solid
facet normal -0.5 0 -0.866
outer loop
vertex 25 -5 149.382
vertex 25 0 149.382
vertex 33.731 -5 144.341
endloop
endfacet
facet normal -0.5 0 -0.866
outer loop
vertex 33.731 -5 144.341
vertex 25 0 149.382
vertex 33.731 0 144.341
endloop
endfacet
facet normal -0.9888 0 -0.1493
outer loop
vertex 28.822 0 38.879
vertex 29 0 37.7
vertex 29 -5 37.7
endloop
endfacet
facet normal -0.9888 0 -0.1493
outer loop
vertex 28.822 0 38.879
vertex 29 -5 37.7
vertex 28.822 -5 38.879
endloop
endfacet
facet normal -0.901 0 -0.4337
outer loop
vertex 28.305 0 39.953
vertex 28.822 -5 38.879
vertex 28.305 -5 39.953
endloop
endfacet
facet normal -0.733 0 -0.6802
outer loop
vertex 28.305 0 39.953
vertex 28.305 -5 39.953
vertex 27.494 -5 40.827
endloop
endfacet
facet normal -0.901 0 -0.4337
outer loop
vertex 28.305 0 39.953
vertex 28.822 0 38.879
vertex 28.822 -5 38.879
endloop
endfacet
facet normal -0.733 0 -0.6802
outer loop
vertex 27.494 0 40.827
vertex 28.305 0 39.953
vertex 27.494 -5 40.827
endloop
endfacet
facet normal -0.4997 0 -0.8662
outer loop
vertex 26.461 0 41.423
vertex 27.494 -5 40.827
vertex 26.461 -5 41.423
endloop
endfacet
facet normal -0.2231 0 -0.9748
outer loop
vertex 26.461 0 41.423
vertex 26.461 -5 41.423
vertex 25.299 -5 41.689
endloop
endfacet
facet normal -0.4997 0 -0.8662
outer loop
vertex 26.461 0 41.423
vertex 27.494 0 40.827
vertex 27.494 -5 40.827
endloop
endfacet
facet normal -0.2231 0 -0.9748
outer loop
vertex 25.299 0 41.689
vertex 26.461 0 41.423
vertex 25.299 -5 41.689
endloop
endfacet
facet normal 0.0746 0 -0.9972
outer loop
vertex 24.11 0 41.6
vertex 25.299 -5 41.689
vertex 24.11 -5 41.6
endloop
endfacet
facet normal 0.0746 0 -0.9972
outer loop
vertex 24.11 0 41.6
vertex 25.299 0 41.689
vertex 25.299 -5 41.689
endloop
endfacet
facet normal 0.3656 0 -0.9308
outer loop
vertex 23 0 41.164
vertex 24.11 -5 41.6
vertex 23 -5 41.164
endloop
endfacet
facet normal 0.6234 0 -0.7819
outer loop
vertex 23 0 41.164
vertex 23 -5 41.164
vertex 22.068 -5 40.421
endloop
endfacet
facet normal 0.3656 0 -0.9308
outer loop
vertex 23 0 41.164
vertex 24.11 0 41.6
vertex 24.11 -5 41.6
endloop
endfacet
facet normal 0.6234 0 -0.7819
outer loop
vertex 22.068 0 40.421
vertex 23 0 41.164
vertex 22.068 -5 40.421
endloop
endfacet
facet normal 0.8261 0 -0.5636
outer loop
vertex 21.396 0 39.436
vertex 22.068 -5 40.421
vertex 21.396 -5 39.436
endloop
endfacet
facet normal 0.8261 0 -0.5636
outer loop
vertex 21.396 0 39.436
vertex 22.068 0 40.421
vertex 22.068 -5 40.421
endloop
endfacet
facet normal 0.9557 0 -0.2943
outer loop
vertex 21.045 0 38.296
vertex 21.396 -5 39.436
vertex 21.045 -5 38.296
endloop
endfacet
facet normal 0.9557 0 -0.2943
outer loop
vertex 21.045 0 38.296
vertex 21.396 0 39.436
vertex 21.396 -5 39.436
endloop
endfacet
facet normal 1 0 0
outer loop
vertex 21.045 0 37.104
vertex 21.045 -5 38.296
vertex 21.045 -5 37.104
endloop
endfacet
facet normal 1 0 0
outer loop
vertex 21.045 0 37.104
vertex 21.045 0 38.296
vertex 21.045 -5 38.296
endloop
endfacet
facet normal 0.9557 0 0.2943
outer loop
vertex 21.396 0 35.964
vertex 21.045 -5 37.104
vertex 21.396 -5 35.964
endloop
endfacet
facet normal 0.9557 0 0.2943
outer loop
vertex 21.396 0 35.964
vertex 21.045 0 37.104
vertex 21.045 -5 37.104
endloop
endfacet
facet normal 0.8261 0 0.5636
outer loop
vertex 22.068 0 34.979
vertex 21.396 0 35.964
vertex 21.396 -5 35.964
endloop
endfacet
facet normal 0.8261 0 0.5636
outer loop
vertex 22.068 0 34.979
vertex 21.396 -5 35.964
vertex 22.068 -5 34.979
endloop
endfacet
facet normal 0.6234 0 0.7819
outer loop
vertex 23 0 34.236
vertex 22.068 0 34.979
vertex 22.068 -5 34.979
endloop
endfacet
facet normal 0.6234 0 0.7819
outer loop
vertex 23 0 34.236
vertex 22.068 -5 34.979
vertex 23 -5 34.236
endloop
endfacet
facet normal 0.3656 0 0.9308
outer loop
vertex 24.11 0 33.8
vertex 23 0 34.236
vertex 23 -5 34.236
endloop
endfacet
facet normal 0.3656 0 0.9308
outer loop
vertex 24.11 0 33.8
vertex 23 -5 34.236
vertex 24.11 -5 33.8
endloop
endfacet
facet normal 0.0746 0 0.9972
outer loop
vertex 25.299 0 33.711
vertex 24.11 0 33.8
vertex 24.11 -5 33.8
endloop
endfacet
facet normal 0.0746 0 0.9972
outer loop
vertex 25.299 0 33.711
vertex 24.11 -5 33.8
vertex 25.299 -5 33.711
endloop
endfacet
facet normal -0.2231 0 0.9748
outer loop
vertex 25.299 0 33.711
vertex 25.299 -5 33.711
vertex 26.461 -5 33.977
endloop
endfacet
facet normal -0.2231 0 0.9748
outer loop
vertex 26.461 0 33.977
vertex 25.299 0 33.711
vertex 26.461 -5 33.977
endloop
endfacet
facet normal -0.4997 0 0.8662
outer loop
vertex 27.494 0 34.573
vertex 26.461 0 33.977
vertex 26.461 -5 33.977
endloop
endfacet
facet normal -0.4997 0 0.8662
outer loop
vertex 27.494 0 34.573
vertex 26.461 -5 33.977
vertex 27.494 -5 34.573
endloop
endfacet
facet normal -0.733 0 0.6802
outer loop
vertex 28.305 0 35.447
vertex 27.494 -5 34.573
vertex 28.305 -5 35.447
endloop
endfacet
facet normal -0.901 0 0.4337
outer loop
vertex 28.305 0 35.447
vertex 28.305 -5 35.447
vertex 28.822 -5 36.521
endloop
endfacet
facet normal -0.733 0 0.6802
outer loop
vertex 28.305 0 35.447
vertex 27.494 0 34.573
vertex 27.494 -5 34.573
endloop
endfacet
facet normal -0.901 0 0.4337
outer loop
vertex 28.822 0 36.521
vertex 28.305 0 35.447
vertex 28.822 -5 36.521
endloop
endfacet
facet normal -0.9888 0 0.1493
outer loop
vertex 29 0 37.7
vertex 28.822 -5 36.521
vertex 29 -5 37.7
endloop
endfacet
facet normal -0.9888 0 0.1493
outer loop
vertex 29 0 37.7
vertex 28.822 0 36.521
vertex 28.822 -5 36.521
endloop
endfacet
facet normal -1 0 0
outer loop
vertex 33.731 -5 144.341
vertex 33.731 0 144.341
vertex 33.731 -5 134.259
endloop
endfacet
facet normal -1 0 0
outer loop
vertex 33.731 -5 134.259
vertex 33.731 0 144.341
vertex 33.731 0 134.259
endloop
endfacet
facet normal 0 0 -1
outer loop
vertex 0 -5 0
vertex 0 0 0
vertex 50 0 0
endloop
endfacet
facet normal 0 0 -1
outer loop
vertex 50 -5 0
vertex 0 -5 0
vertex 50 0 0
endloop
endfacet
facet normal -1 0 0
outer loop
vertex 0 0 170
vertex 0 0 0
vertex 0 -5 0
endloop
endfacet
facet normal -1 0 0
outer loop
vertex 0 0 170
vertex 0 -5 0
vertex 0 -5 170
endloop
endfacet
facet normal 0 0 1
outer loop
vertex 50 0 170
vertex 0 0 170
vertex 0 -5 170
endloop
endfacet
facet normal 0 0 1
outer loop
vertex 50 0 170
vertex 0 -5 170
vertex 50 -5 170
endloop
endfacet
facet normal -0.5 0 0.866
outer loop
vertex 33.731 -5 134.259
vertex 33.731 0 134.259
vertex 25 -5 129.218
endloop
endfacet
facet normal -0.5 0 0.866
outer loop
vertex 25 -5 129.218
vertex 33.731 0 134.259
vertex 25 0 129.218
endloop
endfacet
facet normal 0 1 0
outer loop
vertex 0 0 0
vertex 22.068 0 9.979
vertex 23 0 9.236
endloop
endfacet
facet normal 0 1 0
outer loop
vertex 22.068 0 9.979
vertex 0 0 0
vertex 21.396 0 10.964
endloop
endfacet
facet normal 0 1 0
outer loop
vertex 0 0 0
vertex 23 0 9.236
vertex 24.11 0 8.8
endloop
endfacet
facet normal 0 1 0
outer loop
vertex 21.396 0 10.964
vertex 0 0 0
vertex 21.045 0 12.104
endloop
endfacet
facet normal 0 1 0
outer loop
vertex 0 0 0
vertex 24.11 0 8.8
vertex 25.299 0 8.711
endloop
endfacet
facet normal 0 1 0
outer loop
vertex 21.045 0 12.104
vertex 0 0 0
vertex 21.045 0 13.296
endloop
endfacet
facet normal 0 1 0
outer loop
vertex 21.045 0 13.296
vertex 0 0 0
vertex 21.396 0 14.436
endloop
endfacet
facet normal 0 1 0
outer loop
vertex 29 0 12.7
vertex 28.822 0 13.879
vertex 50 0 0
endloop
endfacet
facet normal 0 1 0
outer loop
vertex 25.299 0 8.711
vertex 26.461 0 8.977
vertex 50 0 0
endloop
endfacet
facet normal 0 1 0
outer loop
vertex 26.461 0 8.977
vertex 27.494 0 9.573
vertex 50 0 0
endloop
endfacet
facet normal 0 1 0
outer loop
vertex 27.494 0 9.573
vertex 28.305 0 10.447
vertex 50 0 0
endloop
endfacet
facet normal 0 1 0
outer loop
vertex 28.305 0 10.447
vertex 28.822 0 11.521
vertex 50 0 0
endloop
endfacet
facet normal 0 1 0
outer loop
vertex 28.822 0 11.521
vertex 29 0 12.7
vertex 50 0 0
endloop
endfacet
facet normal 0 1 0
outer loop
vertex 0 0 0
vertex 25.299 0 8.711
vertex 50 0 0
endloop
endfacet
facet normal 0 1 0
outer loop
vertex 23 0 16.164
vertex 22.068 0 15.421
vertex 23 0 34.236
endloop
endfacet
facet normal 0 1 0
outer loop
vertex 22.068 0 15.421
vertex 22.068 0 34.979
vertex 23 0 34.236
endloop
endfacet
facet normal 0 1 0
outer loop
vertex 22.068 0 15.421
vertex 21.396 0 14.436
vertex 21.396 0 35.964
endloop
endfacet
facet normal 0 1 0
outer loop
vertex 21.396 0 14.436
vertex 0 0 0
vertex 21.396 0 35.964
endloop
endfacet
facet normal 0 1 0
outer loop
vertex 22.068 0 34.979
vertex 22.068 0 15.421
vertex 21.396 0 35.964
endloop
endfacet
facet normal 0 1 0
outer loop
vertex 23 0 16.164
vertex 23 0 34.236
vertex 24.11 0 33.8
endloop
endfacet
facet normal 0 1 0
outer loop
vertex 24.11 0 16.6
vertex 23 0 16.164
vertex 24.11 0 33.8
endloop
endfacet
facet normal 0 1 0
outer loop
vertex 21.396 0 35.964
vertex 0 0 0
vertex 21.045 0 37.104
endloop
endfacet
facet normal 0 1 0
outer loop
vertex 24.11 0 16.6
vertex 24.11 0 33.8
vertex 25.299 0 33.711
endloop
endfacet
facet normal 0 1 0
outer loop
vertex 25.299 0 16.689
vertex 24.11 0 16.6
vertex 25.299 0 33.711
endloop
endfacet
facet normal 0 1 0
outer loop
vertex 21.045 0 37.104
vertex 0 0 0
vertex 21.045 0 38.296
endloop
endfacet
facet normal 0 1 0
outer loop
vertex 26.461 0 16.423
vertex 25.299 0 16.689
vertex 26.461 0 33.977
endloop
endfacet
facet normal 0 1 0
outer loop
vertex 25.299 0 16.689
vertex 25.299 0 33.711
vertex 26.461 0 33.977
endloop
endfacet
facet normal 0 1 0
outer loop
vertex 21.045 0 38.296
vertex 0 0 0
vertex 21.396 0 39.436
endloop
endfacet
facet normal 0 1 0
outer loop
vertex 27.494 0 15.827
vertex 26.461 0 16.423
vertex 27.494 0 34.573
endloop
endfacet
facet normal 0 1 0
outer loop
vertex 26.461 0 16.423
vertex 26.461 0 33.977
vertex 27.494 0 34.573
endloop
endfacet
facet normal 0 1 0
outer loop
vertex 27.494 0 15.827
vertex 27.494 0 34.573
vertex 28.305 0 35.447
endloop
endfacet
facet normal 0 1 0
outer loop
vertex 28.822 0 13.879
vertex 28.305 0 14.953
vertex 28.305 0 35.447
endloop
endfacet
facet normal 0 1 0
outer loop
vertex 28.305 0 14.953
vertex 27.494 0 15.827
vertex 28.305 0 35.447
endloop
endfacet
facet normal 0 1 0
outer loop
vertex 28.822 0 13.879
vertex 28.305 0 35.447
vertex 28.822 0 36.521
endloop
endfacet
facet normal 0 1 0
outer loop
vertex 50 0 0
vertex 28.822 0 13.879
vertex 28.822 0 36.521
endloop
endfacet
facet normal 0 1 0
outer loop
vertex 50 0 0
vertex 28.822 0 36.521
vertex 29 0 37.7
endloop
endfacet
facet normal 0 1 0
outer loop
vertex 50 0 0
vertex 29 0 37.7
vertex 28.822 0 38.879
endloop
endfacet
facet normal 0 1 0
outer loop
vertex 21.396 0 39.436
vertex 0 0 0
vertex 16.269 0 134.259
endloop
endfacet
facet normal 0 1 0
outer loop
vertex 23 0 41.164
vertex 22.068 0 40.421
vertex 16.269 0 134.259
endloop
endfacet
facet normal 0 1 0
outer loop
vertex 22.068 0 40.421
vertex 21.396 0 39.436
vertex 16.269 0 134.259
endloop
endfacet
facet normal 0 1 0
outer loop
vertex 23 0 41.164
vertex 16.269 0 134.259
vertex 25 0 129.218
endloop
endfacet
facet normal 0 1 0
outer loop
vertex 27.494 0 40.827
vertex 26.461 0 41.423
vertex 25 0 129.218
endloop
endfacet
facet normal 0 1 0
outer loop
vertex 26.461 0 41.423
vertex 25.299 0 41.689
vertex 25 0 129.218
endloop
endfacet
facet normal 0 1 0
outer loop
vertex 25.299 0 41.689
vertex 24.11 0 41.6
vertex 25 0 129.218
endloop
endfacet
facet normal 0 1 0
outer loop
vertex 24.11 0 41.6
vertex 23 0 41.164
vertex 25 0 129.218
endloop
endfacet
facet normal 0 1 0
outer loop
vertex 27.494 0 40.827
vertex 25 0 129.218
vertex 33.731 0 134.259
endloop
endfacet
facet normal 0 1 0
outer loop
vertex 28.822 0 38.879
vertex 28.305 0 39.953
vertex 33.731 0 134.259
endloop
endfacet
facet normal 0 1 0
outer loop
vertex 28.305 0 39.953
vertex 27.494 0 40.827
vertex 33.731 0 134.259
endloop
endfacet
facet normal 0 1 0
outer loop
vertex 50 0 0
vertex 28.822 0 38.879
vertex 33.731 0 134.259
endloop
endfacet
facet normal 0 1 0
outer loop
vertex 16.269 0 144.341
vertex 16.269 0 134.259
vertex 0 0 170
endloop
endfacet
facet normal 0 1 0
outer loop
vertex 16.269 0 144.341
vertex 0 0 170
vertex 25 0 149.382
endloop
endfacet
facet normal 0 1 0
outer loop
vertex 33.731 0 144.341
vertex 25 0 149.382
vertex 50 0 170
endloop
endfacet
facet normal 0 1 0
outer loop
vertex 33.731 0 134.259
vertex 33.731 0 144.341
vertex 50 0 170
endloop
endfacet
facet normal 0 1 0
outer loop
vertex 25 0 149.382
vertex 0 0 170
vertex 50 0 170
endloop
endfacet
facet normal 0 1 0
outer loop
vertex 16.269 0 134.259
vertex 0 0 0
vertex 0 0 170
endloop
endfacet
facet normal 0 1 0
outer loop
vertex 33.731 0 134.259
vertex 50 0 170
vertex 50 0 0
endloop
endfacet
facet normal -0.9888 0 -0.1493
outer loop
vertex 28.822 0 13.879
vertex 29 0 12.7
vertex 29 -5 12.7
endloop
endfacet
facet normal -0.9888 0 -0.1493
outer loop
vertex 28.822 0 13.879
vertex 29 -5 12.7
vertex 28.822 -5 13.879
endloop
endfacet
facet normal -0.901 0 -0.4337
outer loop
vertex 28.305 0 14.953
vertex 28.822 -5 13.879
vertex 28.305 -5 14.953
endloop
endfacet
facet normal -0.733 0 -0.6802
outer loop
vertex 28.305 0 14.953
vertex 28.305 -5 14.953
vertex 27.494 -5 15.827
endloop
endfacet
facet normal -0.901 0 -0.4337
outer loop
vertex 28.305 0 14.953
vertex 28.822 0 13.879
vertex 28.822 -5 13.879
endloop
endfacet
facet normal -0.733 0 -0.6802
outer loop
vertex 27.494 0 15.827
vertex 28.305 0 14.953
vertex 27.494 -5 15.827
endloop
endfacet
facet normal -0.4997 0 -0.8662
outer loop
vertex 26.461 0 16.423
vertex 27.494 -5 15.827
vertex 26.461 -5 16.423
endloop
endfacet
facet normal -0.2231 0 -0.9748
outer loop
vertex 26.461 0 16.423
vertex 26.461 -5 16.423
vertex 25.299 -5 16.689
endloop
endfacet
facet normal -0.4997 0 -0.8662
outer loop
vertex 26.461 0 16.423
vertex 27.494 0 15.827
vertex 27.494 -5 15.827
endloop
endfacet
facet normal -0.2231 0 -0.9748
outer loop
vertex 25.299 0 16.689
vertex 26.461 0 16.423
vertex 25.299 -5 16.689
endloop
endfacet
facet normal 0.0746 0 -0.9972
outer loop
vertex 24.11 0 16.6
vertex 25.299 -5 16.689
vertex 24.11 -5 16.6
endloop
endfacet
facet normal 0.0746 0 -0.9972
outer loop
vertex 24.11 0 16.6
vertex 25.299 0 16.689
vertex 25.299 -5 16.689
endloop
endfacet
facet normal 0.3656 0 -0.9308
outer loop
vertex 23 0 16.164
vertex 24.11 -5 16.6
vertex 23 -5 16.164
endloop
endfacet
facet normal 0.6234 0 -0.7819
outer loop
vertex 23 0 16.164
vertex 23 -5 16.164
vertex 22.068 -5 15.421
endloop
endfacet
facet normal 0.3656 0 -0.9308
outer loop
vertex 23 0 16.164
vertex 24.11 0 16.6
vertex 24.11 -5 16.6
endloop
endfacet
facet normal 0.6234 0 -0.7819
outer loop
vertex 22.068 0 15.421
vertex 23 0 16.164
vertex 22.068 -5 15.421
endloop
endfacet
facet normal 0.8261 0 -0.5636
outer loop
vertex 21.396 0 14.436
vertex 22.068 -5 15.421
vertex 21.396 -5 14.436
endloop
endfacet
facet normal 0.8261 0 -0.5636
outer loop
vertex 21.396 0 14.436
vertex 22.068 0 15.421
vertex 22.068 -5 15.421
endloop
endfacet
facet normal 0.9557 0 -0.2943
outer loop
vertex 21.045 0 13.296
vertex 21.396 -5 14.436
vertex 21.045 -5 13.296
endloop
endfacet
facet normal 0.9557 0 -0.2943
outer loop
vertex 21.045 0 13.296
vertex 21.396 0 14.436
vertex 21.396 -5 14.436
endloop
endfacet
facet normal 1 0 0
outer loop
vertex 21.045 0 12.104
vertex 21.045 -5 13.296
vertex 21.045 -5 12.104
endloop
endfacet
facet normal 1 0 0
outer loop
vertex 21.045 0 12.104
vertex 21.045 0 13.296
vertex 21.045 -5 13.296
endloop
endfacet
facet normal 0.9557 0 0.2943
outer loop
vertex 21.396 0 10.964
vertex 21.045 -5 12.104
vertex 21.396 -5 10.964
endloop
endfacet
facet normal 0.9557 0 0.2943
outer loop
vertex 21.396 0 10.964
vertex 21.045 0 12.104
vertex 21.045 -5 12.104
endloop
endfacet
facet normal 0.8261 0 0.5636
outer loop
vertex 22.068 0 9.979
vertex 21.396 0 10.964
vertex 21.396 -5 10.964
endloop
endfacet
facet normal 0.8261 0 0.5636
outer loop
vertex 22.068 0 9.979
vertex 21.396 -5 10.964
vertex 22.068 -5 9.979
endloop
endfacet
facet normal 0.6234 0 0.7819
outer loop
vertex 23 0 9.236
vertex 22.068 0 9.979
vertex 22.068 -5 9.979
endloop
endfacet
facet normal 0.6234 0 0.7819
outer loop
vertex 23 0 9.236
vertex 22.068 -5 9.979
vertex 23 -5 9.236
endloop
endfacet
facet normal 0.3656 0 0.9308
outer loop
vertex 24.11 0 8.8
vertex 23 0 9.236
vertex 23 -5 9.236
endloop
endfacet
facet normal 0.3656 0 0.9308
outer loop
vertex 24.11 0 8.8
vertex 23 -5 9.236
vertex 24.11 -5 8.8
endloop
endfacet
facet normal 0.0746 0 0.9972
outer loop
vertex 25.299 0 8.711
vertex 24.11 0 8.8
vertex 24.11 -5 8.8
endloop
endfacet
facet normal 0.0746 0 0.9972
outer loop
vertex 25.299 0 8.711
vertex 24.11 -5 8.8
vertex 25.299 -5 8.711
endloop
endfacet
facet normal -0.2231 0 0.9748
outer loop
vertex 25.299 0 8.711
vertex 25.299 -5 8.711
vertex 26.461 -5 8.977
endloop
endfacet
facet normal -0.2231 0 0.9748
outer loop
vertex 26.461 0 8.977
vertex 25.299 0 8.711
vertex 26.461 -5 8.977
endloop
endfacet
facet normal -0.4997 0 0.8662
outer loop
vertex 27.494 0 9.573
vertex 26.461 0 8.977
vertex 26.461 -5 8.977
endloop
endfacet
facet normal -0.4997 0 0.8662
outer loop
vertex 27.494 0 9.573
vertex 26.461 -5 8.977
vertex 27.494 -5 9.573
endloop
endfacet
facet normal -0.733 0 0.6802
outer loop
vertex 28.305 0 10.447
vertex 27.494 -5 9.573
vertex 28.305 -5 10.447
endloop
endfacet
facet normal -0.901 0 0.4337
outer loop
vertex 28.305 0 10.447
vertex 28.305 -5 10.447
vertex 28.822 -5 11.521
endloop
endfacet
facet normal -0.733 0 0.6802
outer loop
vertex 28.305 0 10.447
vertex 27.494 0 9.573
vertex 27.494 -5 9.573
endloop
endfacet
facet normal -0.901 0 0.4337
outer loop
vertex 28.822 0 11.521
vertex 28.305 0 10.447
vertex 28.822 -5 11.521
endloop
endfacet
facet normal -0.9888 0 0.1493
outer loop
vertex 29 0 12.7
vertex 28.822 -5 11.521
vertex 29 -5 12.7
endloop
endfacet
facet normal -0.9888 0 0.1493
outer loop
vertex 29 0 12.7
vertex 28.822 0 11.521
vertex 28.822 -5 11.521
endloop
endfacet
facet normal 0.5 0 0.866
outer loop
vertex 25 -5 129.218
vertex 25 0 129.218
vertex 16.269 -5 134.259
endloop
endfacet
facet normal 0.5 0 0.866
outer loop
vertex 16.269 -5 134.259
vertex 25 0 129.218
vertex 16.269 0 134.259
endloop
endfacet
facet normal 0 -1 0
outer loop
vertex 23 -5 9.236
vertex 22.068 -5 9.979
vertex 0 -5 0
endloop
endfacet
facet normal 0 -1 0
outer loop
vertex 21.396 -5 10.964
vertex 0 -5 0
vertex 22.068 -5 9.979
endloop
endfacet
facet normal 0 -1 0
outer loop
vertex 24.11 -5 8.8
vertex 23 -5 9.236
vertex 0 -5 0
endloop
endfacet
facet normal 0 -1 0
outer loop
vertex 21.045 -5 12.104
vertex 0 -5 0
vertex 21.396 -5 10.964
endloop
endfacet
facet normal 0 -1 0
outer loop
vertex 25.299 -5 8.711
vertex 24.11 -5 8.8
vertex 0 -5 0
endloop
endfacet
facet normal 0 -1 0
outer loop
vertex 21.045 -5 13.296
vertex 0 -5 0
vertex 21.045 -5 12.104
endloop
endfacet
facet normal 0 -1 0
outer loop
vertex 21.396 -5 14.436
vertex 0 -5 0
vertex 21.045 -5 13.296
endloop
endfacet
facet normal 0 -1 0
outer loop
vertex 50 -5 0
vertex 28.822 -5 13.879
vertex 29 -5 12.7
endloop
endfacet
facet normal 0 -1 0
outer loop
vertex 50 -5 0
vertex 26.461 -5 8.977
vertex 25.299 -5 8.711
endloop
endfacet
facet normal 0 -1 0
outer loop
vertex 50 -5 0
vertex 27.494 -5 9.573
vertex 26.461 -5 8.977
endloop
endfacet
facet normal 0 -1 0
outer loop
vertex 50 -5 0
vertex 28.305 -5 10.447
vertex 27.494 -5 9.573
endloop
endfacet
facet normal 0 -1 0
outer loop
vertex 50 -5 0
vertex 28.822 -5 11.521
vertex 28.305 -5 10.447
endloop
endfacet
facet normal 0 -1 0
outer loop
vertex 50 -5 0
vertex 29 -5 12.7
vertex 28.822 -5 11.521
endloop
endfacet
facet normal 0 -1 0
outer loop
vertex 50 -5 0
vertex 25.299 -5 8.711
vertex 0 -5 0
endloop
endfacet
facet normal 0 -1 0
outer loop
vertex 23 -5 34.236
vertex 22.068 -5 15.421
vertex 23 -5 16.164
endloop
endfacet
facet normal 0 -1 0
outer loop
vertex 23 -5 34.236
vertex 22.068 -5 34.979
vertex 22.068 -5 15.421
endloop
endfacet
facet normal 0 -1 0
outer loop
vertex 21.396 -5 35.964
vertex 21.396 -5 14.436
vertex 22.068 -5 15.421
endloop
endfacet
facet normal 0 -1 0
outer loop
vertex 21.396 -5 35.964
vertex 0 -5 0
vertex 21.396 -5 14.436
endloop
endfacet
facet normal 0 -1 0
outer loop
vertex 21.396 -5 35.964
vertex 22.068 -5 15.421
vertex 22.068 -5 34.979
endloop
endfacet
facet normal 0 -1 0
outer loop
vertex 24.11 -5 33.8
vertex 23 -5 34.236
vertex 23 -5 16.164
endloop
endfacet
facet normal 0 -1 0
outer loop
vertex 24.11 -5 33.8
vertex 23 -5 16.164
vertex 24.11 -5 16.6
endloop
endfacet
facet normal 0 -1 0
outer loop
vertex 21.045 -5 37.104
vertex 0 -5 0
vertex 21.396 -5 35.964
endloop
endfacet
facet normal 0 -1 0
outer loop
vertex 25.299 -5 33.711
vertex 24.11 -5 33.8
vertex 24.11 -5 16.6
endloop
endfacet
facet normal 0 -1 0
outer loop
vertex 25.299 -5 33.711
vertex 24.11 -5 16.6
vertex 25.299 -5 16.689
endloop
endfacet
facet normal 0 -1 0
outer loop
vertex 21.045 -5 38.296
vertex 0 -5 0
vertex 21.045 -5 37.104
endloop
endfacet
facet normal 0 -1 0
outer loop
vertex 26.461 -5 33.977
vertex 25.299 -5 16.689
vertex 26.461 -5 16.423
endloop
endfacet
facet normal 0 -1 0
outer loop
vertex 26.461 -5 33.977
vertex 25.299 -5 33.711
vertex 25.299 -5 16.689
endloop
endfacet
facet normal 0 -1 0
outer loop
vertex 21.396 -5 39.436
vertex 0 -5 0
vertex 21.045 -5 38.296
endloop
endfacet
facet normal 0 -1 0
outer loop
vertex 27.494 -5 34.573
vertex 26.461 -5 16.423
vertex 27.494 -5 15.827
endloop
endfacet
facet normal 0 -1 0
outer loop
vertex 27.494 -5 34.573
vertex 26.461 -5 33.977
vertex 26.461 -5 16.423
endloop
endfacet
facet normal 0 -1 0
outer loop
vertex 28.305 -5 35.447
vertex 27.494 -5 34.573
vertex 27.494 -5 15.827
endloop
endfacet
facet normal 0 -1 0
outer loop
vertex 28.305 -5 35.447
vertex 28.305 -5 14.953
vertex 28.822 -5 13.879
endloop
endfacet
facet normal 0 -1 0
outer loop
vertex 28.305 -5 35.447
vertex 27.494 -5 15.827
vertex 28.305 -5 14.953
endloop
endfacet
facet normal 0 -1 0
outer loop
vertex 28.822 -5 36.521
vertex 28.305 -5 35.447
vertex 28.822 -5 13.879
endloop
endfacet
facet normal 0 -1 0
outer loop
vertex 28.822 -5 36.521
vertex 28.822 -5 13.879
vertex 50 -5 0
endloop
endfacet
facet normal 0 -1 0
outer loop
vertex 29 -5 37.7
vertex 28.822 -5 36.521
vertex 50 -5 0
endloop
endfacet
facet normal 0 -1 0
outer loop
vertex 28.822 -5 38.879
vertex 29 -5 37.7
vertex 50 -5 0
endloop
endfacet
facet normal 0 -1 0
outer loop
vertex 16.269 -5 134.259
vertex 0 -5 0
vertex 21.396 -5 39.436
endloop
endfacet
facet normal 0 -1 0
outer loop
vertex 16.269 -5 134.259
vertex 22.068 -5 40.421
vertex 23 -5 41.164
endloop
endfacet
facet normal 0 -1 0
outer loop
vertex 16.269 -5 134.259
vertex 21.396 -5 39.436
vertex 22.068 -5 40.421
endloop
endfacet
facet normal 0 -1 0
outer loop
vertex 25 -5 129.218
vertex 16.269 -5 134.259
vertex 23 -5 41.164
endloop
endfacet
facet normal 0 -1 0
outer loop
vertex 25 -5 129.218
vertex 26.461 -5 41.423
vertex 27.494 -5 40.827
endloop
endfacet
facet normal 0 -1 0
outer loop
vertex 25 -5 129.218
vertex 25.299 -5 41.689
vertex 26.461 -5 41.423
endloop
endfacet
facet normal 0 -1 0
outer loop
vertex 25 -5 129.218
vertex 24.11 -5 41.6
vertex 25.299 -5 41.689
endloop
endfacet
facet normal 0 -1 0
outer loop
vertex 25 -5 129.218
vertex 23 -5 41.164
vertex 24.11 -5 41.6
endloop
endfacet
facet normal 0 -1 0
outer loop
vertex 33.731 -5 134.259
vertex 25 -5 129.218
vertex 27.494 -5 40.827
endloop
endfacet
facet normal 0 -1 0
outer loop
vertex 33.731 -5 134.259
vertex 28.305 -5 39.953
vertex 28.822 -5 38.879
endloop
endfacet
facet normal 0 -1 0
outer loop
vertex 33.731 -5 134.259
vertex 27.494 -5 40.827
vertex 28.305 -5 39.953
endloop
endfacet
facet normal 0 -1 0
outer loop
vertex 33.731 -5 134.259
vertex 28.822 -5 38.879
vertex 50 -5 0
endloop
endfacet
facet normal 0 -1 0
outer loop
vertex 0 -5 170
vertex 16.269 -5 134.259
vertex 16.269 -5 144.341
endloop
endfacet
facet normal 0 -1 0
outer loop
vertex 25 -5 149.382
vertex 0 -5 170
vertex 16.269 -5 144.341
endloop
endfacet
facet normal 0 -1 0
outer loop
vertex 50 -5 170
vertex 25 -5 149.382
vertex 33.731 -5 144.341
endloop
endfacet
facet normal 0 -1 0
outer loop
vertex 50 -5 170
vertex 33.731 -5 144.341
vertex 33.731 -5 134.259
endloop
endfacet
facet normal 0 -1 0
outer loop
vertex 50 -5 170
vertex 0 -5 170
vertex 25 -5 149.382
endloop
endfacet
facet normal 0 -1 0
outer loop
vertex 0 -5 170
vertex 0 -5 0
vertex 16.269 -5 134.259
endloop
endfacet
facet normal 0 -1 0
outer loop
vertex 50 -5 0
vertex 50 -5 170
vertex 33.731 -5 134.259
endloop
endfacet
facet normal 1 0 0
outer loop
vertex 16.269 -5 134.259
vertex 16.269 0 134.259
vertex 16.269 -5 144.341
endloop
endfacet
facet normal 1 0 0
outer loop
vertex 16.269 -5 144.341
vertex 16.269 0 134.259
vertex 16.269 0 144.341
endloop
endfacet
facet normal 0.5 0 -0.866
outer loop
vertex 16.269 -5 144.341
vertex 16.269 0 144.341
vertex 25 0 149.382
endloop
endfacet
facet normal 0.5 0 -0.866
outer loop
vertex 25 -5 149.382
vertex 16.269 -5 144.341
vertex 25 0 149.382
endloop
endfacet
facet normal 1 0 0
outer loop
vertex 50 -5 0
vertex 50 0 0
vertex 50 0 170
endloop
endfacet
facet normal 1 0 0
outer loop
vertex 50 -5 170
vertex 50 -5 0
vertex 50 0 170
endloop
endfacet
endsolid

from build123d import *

# Parameters (mm, degrees)
F0_W     = 50
F0_H     = 170
F0_R     = 4
F1_DEPTH = 5


with BuildPart() as f1:
    # F0 (on Front) → F1 (new body)
    with BuildSketch(Plane.XZ):
        with Locations((25, 85)):
            Rectangle(F0_W, F0_H)
        with Locations((25, 12.7)):
            Circle(F0_R, mode=Mode.SUBTRACT)
        with Locations((25, 37.7)):
            Circle(F0_R, mode=Mode.SUBTRACT)
        Polygon((25, 149.381979), (33.73125, 144.34099), (33.73125, 134.25901), (25, 129.218021), (16.26875, 134.25901), (16.26875, 144.34099), align=None, mode=Mode.SUBTRACT)
    extrude(amount=F1_DEPTH)


solid = f1.part
